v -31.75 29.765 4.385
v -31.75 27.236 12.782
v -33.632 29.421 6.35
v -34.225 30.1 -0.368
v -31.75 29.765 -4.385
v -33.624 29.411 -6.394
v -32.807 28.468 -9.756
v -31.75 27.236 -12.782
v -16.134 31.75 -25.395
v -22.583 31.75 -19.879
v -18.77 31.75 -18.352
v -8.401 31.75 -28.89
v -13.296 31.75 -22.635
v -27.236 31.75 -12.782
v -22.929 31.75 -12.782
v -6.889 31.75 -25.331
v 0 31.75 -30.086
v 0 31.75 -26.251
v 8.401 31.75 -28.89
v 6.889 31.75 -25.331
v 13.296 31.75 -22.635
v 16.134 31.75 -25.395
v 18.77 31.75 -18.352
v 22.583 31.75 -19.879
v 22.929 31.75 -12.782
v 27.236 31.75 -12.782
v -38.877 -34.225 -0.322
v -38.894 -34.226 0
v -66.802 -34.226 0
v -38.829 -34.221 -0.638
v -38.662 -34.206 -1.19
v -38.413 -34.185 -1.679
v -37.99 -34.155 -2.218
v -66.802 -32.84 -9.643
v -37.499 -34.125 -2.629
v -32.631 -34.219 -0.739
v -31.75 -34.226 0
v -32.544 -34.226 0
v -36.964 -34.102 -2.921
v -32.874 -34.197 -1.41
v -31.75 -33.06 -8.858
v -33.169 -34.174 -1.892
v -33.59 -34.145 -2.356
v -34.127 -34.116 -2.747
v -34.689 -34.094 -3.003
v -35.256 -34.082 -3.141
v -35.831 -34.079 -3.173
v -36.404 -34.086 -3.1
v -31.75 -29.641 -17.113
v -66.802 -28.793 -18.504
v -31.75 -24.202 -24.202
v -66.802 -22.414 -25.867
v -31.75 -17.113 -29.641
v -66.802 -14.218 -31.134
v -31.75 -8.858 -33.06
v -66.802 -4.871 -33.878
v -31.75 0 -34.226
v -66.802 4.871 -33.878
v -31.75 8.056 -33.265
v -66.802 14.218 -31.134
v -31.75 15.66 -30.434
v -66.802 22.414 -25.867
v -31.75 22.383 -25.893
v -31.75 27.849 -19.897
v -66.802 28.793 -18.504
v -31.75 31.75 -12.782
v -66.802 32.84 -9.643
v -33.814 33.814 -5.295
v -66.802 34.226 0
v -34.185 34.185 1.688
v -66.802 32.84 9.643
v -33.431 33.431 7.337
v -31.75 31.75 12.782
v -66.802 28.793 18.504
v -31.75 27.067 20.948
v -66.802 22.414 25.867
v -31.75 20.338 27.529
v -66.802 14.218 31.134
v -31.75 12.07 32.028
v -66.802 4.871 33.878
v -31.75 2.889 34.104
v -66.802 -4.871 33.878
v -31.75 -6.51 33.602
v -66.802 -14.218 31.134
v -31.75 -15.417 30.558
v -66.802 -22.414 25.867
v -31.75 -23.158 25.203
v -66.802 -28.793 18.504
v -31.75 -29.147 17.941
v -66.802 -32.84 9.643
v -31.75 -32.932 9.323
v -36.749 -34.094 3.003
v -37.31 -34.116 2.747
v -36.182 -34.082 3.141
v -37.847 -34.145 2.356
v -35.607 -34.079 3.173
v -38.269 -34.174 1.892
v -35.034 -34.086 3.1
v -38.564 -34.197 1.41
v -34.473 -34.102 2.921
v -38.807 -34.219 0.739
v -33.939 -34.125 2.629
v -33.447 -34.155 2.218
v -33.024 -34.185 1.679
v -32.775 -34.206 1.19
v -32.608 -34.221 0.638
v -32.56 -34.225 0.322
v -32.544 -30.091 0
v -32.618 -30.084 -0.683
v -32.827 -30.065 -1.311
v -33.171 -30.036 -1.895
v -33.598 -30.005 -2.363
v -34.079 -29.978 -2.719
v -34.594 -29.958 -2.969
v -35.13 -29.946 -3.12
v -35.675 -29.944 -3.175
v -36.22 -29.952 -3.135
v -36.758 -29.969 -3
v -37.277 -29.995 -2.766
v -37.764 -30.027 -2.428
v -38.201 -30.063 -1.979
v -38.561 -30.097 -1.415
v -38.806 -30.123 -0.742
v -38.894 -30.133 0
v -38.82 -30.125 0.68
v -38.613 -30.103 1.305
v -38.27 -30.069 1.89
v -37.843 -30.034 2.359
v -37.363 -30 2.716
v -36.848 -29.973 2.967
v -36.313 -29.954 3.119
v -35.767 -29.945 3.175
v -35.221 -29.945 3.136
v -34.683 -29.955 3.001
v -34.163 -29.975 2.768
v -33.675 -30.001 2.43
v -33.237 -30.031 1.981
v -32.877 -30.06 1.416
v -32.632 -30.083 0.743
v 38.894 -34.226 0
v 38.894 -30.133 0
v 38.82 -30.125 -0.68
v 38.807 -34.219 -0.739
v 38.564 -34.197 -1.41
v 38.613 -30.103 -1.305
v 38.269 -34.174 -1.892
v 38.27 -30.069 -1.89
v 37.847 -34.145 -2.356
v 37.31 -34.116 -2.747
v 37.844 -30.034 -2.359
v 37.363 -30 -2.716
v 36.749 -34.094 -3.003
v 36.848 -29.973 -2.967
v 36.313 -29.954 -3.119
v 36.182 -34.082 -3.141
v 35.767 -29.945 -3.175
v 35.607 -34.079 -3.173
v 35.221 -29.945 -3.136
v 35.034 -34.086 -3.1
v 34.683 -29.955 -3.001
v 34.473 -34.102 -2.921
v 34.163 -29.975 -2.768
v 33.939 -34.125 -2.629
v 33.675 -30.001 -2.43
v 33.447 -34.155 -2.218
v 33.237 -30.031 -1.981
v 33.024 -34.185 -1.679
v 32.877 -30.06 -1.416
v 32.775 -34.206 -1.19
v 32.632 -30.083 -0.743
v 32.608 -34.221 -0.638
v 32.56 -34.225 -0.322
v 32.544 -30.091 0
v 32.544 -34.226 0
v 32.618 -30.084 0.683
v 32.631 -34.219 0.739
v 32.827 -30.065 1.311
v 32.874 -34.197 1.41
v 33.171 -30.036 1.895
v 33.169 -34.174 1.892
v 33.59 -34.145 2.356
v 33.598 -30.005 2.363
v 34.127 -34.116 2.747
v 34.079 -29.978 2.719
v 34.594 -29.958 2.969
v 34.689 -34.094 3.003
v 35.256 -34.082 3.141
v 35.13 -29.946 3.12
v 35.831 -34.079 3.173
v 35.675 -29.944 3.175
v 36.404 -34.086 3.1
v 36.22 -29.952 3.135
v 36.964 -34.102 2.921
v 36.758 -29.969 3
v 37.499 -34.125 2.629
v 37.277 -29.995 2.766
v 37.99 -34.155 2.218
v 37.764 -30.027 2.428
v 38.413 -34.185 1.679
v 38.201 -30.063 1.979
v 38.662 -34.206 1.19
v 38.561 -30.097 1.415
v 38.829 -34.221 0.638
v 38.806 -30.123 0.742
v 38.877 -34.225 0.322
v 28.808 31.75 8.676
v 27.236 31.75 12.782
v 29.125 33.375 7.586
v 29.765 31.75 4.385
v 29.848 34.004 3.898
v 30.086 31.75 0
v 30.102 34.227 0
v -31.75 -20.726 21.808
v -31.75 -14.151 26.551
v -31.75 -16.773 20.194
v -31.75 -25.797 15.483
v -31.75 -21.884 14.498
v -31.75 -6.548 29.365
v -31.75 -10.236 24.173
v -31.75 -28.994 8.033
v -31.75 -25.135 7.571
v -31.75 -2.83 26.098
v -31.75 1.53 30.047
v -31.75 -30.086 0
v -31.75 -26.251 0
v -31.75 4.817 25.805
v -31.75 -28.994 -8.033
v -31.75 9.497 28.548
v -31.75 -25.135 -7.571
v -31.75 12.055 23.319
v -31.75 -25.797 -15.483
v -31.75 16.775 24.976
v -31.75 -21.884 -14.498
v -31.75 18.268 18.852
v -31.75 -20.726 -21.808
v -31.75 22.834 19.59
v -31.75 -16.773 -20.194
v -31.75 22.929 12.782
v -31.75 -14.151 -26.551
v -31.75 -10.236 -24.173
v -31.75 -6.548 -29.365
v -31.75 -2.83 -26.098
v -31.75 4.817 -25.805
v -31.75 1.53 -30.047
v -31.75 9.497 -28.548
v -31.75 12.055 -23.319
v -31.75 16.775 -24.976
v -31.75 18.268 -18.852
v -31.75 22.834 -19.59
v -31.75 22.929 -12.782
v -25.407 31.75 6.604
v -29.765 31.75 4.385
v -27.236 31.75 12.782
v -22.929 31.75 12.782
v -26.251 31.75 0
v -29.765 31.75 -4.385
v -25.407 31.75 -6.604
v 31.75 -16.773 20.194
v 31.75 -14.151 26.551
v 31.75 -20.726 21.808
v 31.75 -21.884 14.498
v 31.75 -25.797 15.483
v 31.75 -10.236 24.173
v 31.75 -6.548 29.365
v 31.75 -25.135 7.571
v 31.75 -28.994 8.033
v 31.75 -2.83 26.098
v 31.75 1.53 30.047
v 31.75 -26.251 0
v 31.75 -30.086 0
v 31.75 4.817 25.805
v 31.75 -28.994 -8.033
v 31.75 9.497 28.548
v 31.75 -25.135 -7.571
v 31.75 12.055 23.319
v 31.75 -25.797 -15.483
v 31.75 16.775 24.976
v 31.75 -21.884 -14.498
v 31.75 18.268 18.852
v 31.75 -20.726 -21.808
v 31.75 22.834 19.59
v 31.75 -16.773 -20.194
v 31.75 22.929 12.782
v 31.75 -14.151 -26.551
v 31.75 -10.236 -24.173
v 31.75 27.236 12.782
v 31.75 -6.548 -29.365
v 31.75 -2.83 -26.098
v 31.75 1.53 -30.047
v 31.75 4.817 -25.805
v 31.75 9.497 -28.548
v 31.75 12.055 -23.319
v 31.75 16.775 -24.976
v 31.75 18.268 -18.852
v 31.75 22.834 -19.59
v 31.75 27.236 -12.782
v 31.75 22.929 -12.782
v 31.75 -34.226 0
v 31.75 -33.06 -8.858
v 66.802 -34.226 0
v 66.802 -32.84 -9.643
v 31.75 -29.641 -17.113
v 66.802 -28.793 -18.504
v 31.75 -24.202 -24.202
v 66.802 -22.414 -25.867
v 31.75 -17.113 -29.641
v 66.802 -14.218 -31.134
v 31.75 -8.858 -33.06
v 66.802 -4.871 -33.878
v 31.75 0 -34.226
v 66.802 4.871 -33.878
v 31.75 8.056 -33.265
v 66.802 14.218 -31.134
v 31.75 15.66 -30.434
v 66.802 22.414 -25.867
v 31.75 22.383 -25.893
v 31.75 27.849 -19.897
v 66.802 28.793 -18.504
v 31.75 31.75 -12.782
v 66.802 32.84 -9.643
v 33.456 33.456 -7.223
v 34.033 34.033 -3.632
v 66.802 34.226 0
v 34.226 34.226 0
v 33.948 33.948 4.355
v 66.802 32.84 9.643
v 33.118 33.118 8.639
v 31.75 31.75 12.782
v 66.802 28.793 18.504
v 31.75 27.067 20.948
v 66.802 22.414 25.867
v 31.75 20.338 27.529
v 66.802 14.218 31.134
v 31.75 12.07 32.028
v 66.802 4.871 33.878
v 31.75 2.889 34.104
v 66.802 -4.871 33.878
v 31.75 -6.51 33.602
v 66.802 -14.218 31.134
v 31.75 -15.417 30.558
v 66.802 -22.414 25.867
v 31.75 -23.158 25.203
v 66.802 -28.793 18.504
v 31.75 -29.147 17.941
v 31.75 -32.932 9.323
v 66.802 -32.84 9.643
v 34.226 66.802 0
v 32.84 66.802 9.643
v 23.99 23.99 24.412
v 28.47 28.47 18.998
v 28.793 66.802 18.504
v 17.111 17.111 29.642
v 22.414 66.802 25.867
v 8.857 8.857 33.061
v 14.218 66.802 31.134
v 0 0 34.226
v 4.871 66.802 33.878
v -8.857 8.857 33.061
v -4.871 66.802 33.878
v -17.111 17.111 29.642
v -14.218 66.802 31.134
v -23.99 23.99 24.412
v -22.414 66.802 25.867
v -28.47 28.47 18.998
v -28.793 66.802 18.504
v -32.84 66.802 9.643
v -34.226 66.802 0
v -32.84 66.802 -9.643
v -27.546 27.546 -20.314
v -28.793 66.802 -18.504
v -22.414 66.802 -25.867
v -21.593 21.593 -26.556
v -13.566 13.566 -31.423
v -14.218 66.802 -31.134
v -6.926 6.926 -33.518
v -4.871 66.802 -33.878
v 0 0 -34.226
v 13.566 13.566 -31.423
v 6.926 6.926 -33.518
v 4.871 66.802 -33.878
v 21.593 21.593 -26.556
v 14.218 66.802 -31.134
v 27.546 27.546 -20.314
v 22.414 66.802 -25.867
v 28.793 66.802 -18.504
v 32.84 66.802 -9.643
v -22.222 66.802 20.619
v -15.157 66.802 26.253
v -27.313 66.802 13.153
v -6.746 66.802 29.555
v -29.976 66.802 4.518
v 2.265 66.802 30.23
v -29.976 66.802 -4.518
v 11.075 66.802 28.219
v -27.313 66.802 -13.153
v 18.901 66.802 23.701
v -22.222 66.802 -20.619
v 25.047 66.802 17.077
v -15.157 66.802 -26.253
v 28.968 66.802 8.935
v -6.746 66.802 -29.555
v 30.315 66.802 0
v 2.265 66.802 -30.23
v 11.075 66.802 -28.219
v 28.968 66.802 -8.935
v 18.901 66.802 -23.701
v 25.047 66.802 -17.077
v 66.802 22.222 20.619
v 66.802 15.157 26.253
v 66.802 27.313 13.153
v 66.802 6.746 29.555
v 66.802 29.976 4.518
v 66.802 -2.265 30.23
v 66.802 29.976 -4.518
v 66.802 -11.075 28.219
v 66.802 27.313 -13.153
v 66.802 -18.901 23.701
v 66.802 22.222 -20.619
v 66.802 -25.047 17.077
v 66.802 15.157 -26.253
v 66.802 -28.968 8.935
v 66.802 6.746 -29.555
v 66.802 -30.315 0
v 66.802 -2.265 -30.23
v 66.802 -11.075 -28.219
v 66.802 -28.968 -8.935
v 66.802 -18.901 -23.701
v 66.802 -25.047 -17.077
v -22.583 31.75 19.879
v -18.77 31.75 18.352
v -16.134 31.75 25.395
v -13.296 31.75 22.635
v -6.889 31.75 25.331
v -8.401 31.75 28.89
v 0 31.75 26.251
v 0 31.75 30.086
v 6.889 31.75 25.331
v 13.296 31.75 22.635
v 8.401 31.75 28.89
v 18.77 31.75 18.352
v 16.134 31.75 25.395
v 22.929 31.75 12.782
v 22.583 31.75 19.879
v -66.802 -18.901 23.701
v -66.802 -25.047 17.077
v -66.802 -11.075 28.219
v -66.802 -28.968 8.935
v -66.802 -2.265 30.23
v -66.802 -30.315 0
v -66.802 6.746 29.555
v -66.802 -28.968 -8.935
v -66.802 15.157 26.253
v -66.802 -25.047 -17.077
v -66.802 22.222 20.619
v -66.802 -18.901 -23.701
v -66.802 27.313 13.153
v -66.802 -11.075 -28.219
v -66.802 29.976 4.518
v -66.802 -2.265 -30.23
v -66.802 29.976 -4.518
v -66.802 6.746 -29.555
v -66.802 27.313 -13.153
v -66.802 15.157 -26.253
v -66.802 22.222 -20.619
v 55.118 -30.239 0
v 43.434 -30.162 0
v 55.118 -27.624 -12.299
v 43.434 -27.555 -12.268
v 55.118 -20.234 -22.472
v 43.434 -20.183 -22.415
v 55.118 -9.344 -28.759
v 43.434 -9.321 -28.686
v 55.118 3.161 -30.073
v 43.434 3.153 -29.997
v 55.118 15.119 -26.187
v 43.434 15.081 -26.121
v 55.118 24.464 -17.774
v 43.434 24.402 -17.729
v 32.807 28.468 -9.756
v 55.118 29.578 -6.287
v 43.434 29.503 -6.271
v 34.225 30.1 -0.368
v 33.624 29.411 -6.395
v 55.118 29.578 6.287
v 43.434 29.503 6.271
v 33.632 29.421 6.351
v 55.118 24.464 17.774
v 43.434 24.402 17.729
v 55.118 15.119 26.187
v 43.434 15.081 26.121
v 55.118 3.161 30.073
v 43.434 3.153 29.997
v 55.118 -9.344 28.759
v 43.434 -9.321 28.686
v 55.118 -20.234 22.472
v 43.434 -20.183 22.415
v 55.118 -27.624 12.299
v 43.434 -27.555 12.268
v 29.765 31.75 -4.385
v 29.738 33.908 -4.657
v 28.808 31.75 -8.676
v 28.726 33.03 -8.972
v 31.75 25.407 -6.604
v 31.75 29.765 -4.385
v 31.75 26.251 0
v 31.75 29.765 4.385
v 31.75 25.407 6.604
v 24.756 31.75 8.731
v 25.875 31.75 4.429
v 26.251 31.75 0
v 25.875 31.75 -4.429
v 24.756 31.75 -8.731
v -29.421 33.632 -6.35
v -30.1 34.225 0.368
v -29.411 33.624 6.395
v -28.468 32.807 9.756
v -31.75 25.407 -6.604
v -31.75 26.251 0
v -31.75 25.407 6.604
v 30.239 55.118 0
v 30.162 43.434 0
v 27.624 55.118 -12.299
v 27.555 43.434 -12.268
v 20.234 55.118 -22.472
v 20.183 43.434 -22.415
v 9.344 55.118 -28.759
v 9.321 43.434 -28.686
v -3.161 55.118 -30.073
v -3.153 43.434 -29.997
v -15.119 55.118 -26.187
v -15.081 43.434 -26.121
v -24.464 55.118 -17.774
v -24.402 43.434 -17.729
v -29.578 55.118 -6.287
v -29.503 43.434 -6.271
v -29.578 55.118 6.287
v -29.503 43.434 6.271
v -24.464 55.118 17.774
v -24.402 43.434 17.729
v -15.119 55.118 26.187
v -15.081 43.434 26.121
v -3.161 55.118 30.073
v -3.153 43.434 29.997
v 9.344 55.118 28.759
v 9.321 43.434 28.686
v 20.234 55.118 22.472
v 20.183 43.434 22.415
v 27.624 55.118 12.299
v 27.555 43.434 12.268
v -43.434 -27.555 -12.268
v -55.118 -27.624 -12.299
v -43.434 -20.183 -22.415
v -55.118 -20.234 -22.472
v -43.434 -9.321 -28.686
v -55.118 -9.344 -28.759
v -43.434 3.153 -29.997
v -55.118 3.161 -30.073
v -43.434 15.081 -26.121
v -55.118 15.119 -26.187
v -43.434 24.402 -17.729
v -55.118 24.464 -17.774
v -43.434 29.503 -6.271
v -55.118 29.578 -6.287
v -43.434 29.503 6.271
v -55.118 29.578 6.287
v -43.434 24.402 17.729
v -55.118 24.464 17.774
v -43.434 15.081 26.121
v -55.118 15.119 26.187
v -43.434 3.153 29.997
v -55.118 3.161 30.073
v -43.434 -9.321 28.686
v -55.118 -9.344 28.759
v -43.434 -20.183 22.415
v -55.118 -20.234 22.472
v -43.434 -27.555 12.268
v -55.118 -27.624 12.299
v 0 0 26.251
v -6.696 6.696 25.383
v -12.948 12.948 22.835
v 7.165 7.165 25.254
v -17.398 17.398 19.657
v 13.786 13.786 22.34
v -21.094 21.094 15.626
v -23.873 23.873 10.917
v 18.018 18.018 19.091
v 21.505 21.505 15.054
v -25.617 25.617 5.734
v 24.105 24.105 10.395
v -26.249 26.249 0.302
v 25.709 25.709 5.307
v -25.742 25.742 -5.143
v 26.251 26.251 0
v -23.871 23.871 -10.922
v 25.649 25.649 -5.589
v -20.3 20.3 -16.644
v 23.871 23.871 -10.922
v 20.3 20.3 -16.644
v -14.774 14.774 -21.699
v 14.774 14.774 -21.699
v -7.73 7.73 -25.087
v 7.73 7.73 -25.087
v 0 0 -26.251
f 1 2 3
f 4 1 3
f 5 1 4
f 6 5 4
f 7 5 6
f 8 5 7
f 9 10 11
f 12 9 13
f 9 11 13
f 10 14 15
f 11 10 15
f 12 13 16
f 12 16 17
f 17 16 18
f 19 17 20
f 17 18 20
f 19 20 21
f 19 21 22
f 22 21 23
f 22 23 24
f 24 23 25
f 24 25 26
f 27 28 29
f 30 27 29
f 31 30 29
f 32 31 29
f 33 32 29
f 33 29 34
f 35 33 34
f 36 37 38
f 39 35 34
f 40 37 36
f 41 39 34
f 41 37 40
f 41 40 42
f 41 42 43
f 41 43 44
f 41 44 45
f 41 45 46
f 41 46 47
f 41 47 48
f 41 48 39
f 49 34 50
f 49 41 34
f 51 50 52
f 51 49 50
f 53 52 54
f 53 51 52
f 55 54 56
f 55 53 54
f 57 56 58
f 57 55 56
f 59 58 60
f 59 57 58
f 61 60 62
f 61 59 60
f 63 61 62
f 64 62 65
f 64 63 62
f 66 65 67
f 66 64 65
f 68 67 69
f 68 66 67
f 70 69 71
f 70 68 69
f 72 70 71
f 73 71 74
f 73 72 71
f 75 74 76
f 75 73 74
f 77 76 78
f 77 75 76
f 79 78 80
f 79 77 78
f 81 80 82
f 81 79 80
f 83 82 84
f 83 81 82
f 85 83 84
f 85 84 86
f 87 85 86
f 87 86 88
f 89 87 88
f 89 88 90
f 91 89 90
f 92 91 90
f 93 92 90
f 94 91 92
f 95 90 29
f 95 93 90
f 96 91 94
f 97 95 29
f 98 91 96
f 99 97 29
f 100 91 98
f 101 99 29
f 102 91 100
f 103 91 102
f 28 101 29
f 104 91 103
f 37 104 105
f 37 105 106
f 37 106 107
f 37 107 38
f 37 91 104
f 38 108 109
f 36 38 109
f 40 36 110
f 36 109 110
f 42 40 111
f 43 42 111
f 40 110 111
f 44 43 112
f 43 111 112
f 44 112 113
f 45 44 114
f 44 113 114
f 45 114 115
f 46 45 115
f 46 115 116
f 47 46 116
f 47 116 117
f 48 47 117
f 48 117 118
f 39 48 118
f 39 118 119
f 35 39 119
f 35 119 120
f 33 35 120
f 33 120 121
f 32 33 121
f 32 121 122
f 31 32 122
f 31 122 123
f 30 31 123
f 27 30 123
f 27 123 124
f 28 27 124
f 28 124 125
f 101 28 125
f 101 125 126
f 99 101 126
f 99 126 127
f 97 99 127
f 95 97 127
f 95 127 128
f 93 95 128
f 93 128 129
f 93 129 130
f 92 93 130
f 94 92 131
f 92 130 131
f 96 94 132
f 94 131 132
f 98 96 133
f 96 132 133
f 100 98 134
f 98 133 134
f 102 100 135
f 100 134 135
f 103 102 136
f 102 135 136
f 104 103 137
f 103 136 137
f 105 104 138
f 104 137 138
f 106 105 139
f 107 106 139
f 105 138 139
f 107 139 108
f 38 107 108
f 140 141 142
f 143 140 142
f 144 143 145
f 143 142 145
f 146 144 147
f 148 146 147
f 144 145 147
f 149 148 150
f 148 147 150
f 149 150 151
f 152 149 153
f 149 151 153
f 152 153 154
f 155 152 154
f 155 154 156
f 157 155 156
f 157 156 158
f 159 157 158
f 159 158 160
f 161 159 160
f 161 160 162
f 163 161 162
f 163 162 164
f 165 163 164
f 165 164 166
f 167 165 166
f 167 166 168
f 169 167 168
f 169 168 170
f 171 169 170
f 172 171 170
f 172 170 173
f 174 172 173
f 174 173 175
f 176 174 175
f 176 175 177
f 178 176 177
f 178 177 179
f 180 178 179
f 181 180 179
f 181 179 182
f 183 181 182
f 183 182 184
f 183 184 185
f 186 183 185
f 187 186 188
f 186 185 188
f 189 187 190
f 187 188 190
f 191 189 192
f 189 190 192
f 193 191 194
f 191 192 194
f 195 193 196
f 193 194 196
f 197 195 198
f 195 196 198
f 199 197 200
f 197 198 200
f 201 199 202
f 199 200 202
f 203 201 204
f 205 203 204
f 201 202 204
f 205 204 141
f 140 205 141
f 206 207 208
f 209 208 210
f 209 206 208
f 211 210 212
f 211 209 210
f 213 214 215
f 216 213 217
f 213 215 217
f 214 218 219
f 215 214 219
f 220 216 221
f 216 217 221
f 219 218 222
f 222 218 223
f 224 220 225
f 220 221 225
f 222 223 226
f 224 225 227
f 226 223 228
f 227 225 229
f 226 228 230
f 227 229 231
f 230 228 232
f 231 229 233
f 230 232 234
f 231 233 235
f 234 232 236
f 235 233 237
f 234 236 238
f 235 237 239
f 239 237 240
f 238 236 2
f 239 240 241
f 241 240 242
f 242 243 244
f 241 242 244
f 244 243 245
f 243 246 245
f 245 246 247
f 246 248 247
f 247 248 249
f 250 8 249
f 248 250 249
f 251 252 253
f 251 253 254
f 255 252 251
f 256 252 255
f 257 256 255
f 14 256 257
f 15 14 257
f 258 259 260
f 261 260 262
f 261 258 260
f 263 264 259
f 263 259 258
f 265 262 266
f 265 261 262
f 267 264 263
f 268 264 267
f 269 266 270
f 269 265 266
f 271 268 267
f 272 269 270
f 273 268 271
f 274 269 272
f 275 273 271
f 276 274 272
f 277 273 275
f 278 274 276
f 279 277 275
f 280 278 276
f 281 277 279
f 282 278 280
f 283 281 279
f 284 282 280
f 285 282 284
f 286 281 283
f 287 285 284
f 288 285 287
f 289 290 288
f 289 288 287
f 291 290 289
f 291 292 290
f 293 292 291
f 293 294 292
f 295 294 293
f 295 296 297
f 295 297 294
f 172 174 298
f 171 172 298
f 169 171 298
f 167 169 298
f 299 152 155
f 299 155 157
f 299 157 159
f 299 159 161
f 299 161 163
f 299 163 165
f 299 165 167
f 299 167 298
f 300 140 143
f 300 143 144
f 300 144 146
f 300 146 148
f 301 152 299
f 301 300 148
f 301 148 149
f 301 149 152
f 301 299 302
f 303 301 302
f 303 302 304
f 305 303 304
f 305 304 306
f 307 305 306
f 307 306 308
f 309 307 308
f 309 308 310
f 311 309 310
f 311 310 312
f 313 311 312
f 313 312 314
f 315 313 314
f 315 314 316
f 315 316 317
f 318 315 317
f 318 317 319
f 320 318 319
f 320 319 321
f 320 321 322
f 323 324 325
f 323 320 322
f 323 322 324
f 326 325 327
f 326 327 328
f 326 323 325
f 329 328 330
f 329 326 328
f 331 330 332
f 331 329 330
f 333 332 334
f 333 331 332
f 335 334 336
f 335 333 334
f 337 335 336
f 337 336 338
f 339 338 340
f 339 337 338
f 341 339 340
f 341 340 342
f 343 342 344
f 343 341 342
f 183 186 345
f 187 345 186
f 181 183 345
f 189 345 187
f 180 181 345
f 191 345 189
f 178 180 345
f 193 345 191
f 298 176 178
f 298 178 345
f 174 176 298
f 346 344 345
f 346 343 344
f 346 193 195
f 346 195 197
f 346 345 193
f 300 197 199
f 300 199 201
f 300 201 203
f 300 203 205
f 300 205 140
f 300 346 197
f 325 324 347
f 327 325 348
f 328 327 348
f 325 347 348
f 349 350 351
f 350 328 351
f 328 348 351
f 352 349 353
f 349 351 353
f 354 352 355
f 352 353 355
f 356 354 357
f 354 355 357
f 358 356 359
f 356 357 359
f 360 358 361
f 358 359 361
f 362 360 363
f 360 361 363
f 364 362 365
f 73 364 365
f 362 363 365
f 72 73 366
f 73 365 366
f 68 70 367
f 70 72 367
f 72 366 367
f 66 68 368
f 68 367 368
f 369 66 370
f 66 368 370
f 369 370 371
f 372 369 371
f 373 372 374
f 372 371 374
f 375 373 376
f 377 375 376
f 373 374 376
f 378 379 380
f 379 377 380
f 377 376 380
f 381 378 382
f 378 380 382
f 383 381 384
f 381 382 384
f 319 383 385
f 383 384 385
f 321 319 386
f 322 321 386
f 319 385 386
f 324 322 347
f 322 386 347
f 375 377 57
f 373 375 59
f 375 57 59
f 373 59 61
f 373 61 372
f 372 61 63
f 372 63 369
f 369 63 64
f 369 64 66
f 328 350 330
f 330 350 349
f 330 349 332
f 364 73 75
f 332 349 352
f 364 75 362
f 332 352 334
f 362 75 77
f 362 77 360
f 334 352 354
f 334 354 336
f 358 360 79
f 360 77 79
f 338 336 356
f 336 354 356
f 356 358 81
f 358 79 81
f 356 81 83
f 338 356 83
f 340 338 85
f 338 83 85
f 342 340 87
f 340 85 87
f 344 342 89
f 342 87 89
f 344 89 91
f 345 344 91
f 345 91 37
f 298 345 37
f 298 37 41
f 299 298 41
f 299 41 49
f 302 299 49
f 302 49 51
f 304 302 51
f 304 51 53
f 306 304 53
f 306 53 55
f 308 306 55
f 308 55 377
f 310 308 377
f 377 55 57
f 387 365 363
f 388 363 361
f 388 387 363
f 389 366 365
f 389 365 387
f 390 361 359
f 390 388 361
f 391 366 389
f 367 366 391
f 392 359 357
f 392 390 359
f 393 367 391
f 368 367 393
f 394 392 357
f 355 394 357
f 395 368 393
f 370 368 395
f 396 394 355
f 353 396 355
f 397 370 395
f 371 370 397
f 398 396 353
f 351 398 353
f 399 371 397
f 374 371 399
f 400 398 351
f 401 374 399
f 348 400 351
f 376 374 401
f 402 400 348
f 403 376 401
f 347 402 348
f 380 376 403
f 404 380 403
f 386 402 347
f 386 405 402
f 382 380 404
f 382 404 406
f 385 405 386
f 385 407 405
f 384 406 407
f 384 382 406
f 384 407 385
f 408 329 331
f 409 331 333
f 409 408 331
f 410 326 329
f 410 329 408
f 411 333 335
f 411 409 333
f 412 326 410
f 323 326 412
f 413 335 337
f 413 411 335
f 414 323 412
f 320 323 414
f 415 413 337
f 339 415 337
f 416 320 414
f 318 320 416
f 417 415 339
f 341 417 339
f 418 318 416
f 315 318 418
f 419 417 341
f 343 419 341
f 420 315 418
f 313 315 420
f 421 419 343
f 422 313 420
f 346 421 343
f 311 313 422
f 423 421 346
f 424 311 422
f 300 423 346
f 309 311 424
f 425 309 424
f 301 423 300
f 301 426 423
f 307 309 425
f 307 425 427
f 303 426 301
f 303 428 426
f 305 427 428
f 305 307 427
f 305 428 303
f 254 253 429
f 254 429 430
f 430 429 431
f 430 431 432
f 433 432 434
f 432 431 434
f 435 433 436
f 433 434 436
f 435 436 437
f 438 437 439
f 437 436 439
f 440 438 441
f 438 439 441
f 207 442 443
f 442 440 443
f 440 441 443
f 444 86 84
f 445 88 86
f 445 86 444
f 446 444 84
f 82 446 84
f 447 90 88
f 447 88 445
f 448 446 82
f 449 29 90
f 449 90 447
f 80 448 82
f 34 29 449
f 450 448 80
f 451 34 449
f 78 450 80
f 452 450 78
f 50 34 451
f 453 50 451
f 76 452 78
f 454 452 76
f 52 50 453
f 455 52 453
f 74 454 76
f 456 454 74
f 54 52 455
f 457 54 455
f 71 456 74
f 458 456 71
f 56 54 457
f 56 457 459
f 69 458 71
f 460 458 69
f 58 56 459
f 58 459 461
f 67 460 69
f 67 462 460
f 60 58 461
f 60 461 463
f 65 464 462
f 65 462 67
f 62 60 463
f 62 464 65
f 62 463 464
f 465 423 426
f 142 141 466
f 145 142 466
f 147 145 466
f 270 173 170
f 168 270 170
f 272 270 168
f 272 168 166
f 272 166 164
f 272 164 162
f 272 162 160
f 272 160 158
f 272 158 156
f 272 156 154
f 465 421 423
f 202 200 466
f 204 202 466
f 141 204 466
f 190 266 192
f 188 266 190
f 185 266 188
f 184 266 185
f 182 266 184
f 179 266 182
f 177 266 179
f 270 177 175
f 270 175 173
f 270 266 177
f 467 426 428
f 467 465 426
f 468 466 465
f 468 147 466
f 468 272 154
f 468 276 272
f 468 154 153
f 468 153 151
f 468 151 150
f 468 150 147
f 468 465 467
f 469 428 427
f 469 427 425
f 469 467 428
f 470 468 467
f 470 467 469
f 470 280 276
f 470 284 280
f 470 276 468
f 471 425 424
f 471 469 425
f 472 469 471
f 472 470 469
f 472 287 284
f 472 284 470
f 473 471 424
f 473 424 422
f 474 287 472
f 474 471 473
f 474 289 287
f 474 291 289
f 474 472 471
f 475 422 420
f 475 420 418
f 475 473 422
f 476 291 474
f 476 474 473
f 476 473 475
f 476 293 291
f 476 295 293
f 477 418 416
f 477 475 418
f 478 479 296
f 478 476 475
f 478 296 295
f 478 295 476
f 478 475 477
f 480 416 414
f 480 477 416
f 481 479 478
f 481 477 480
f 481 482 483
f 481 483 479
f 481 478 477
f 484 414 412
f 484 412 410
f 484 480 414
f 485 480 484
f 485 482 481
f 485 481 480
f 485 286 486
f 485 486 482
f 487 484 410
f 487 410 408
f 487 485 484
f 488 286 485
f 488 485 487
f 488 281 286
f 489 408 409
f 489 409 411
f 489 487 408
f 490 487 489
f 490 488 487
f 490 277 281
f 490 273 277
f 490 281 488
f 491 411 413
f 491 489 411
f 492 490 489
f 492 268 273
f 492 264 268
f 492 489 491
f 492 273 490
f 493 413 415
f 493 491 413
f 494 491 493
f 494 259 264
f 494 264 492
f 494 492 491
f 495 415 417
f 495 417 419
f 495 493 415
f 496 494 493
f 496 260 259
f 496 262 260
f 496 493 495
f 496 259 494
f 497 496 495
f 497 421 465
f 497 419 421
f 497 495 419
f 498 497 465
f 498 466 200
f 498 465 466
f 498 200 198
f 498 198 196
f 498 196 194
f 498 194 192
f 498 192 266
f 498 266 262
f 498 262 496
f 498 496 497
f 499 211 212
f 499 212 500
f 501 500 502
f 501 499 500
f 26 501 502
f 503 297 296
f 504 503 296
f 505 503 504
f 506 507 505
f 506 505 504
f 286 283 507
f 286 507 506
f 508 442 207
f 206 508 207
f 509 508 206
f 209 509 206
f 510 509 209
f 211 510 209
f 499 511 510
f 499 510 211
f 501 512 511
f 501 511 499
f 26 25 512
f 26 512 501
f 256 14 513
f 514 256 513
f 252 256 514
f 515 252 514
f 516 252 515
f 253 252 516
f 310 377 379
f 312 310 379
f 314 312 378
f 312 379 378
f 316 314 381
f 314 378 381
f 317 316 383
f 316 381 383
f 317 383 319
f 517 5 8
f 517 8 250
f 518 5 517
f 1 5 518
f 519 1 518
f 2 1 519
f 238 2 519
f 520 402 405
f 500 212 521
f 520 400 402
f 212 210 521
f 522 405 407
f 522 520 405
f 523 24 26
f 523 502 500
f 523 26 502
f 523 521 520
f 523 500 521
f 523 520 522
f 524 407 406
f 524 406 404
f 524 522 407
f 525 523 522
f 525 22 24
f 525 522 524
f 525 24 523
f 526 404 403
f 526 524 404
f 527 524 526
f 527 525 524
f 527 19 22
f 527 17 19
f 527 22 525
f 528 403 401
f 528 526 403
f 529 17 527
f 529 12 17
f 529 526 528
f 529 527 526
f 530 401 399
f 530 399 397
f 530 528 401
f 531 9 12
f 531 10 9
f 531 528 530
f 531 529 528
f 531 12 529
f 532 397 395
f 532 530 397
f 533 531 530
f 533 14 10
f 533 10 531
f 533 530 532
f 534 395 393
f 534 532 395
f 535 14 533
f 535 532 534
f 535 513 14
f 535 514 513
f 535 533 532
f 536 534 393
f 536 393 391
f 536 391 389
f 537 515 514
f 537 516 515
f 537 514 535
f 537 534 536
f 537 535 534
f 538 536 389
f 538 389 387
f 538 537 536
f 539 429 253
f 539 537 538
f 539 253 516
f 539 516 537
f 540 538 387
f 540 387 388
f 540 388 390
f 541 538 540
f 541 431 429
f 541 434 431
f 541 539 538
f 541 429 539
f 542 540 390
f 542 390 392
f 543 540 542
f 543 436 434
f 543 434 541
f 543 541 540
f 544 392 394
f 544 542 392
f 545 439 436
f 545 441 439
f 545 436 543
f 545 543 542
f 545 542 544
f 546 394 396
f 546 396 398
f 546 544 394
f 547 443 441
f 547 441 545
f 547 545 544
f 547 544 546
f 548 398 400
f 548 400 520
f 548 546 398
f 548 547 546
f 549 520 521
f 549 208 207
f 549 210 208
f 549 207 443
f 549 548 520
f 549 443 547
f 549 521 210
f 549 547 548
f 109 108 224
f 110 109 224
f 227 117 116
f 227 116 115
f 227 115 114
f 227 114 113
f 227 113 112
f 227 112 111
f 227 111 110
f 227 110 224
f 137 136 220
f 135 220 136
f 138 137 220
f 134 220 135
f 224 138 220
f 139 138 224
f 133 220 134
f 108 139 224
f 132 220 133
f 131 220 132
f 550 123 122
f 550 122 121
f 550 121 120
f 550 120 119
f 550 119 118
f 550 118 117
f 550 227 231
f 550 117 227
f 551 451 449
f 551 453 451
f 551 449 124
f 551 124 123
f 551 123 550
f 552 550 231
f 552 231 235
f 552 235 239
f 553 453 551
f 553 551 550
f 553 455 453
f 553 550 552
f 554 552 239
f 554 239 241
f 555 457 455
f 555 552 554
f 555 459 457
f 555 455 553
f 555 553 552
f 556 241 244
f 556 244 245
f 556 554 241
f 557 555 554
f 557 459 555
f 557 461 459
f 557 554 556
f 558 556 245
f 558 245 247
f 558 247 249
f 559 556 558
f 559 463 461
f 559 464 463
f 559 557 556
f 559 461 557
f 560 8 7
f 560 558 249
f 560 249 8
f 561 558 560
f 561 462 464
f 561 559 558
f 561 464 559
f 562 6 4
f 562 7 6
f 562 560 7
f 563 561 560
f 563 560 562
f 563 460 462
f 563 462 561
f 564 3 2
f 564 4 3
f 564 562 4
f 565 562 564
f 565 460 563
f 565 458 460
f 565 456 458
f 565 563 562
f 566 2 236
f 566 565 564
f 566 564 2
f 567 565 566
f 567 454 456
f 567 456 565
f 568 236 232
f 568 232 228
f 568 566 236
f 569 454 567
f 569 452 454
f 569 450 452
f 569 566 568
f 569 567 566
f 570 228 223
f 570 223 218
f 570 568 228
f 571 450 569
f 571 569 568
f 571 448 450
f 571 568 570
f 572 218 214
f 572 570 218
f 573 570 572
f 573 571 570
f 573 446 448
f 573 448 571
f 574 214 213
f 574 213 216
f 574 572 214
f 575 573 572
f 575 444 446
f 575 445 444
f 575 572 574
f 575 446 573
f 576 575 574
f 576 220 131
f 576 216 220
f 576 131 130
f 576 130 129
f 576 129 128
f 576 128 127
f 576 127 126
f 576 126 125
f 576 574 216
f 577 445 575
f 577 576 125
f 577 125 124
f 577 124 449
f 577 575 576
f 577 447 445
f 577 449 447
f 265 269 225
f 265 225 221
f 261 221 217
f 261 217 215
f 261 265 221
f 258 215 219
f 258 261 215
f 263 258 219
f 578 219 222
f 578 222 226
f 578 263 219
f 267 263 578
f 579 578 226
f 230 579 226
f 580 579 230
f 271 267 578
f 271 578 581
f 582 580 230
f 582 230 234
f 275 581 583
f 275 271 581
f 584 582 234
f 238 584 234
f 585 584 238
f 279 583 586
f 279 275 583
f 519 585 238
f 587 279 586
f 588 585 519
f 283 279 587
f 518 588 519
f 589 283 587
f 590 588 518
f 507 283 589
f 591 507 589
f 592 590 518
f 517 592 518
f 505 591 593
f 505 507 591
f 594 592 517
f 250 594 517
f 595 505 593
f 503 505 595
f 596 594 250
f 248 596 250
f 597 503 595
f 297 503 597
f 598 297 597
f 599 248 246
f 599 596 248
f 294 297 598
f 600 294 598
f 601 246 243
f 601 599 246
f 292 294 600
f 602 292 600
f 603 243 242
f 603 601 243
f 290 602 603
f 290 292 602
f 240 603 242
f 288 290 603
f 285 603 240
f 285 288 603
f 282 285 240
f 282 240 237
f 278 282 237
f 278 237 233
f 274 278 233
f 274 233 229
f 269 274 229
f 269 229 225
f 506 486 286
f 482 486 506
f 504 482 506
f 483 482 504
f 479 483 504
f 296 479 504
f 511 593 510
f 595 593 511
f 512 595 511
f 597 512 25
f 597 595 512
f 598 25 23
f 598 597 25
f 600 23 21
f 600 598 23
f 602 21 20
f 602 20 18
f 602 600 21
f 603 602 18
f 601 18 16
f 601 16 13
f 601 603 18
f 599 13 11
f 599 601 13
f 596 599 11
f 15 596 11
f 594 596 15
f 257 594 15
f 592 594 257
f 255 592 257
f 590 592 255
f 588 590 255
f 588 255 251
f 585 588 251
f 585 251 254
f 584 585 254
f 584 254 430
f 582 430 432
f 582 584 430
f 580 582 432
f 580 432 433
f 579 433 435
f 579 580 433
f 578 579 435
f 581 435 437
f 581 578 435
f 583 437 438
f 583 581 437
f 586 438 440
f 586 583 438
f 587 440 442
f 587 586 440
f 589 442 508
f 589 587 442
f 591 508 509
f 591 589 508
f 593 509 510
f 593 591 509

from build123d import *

# Parameters (mm, degrees)
SKETCH4_R           = 34.2265
BOSS_EXTRUDE1_DEPTH = 63.5
SKETCH5_R           = 34.2265
BOSS_EXTRUDE2_DEPTH = 31.75
CUT_EXTRUDE1_REACH  = 36.227
SKETCH8_R           = 3.175


with BuildPart() as part:
    # Sketch1 → Revolve1 (revolve)
    with BuildSketch(Plane.XY):
        Polygon((-66.802, -34.2265), (-31.75, -34.2265), (-31.75, -30.0863), (-66.802, -30.3149), align=None)
        Polygon((66.802, -30.3149), (31.75, -30.0863), (31.75, -34.2265), (66.802, -34.2265), align=None)
    revolve(axis=Axis((-66.802, 0, 0), (1, 0, 0)))



with BuildPart() as body_2:
    # Sketch2 → Revolve2 (revolve)
    with BuildSketch(Plane.XY):
        Polygon((30.3149, 66.802), (30.0863, 31.75), (34.2265, 31.75), (34.2265, 66.802), align=None)
    revolve(axis=Axis((0, 0, 0), (0, 1, 0)))


with BuildPart() as part_1:
    add(part.part)

    add(body_2.part)  # Boss-Extrude1 merges body 2
    # Sketch4 → Boss-Extrude1 (add)
    with BuildSketch(Plane(origin=(-31.75, 0, 0), x_dir=(0, 0, -1), z_dir=(1, 0, 0))):
        Circle(SKETCH4_R)
    extrude(amount=BOSS_EXTRUDE1_DEPTH)

    # Sketch5 → Boss-Extrude2 (add)
    with BuildSketch(Plane.XZ.offset(-31.75)):
        Circle(SKETCH5_R)
    extrude(amount=BOSS_EXTRUDE2_DEPTH)

    # Sketch6 → Cut-Revolve1 (revolve, cut)
    with BuildSketch(Plane.XY):
        Polygon((-66.802, -30.3149), (-31.75, -30.0863), (-31.75, -26.2509), (31.75, -26.2509), (31.75, -30.0863), (66.802, -30.3149), (66.802, 0), (-66.802, 0), align=None)
    revolve(axis=Axis((66.802, 0, 0), (-1, 0, 0)), mode=Mode.SUBTRACT)

    # Sketch7 → Cut-Revolve2 (revolve, cut)
    with BuildSketch(Plane.XY):
        Polygon((30.3149, 66.802), (30.0863, 31.75), (26.2509, 31.75), (26.2509, 0), (0, 0), (0, 66.802), align=None)
    revolve(axis=Axis((0, 0, 0), (0, 1, 0)), mode=Mode.SUBTRACT)

    # Sketch8 → Cut-Extrude1 (cut, up to next)
    with BuildSketch(Plane(origin=(0, 0, 0), x_dir=(1, 0, 0), z_dir=(0, 1, 0)), mode=Mode.PRIVATE) as cut_extrude1_sk1:
        with Locations((35.71875, 0)):
            Circle(SKETCH8_R)
    cut_extrude1_tool1 = extrude(cut_extrude1_sk1.sketch, amount=-CUT_EXTRUDE1_REACH, mode=Mode.PRIVATE) & part_1.part
    add(cut_extrude1_tool1.solids().sort_by_distance((35.71875, 0, 0))[0], mode=Mode.SUBTRACT)
    # Sketch8 → Cut-Extrude1 (cut, up to next)
    with BuildSketch(Plane(origin=(0, 0, 0), x_dir=(1, 0, 0), z_dir=(0, 1, 0)), mode=Mode.PRIVATE) as cut_extrude1_sk2:
        with Locations((-35.71875, 0)):
            Circle(SKETCH8_R)
    cut_extrude1_tool2 = extrude(cut_extrude1_sk2.sketch, amount=-CUT_EXTRUDE1_REACH, mode=Mode.PRIVATE) & part_1.part
    add(cut_extrude1_tool2.solids().sort_by_distance((-35.71875, 0, 0))[0], mode=Mode.SUBTRACT)


solid = part_1.part
